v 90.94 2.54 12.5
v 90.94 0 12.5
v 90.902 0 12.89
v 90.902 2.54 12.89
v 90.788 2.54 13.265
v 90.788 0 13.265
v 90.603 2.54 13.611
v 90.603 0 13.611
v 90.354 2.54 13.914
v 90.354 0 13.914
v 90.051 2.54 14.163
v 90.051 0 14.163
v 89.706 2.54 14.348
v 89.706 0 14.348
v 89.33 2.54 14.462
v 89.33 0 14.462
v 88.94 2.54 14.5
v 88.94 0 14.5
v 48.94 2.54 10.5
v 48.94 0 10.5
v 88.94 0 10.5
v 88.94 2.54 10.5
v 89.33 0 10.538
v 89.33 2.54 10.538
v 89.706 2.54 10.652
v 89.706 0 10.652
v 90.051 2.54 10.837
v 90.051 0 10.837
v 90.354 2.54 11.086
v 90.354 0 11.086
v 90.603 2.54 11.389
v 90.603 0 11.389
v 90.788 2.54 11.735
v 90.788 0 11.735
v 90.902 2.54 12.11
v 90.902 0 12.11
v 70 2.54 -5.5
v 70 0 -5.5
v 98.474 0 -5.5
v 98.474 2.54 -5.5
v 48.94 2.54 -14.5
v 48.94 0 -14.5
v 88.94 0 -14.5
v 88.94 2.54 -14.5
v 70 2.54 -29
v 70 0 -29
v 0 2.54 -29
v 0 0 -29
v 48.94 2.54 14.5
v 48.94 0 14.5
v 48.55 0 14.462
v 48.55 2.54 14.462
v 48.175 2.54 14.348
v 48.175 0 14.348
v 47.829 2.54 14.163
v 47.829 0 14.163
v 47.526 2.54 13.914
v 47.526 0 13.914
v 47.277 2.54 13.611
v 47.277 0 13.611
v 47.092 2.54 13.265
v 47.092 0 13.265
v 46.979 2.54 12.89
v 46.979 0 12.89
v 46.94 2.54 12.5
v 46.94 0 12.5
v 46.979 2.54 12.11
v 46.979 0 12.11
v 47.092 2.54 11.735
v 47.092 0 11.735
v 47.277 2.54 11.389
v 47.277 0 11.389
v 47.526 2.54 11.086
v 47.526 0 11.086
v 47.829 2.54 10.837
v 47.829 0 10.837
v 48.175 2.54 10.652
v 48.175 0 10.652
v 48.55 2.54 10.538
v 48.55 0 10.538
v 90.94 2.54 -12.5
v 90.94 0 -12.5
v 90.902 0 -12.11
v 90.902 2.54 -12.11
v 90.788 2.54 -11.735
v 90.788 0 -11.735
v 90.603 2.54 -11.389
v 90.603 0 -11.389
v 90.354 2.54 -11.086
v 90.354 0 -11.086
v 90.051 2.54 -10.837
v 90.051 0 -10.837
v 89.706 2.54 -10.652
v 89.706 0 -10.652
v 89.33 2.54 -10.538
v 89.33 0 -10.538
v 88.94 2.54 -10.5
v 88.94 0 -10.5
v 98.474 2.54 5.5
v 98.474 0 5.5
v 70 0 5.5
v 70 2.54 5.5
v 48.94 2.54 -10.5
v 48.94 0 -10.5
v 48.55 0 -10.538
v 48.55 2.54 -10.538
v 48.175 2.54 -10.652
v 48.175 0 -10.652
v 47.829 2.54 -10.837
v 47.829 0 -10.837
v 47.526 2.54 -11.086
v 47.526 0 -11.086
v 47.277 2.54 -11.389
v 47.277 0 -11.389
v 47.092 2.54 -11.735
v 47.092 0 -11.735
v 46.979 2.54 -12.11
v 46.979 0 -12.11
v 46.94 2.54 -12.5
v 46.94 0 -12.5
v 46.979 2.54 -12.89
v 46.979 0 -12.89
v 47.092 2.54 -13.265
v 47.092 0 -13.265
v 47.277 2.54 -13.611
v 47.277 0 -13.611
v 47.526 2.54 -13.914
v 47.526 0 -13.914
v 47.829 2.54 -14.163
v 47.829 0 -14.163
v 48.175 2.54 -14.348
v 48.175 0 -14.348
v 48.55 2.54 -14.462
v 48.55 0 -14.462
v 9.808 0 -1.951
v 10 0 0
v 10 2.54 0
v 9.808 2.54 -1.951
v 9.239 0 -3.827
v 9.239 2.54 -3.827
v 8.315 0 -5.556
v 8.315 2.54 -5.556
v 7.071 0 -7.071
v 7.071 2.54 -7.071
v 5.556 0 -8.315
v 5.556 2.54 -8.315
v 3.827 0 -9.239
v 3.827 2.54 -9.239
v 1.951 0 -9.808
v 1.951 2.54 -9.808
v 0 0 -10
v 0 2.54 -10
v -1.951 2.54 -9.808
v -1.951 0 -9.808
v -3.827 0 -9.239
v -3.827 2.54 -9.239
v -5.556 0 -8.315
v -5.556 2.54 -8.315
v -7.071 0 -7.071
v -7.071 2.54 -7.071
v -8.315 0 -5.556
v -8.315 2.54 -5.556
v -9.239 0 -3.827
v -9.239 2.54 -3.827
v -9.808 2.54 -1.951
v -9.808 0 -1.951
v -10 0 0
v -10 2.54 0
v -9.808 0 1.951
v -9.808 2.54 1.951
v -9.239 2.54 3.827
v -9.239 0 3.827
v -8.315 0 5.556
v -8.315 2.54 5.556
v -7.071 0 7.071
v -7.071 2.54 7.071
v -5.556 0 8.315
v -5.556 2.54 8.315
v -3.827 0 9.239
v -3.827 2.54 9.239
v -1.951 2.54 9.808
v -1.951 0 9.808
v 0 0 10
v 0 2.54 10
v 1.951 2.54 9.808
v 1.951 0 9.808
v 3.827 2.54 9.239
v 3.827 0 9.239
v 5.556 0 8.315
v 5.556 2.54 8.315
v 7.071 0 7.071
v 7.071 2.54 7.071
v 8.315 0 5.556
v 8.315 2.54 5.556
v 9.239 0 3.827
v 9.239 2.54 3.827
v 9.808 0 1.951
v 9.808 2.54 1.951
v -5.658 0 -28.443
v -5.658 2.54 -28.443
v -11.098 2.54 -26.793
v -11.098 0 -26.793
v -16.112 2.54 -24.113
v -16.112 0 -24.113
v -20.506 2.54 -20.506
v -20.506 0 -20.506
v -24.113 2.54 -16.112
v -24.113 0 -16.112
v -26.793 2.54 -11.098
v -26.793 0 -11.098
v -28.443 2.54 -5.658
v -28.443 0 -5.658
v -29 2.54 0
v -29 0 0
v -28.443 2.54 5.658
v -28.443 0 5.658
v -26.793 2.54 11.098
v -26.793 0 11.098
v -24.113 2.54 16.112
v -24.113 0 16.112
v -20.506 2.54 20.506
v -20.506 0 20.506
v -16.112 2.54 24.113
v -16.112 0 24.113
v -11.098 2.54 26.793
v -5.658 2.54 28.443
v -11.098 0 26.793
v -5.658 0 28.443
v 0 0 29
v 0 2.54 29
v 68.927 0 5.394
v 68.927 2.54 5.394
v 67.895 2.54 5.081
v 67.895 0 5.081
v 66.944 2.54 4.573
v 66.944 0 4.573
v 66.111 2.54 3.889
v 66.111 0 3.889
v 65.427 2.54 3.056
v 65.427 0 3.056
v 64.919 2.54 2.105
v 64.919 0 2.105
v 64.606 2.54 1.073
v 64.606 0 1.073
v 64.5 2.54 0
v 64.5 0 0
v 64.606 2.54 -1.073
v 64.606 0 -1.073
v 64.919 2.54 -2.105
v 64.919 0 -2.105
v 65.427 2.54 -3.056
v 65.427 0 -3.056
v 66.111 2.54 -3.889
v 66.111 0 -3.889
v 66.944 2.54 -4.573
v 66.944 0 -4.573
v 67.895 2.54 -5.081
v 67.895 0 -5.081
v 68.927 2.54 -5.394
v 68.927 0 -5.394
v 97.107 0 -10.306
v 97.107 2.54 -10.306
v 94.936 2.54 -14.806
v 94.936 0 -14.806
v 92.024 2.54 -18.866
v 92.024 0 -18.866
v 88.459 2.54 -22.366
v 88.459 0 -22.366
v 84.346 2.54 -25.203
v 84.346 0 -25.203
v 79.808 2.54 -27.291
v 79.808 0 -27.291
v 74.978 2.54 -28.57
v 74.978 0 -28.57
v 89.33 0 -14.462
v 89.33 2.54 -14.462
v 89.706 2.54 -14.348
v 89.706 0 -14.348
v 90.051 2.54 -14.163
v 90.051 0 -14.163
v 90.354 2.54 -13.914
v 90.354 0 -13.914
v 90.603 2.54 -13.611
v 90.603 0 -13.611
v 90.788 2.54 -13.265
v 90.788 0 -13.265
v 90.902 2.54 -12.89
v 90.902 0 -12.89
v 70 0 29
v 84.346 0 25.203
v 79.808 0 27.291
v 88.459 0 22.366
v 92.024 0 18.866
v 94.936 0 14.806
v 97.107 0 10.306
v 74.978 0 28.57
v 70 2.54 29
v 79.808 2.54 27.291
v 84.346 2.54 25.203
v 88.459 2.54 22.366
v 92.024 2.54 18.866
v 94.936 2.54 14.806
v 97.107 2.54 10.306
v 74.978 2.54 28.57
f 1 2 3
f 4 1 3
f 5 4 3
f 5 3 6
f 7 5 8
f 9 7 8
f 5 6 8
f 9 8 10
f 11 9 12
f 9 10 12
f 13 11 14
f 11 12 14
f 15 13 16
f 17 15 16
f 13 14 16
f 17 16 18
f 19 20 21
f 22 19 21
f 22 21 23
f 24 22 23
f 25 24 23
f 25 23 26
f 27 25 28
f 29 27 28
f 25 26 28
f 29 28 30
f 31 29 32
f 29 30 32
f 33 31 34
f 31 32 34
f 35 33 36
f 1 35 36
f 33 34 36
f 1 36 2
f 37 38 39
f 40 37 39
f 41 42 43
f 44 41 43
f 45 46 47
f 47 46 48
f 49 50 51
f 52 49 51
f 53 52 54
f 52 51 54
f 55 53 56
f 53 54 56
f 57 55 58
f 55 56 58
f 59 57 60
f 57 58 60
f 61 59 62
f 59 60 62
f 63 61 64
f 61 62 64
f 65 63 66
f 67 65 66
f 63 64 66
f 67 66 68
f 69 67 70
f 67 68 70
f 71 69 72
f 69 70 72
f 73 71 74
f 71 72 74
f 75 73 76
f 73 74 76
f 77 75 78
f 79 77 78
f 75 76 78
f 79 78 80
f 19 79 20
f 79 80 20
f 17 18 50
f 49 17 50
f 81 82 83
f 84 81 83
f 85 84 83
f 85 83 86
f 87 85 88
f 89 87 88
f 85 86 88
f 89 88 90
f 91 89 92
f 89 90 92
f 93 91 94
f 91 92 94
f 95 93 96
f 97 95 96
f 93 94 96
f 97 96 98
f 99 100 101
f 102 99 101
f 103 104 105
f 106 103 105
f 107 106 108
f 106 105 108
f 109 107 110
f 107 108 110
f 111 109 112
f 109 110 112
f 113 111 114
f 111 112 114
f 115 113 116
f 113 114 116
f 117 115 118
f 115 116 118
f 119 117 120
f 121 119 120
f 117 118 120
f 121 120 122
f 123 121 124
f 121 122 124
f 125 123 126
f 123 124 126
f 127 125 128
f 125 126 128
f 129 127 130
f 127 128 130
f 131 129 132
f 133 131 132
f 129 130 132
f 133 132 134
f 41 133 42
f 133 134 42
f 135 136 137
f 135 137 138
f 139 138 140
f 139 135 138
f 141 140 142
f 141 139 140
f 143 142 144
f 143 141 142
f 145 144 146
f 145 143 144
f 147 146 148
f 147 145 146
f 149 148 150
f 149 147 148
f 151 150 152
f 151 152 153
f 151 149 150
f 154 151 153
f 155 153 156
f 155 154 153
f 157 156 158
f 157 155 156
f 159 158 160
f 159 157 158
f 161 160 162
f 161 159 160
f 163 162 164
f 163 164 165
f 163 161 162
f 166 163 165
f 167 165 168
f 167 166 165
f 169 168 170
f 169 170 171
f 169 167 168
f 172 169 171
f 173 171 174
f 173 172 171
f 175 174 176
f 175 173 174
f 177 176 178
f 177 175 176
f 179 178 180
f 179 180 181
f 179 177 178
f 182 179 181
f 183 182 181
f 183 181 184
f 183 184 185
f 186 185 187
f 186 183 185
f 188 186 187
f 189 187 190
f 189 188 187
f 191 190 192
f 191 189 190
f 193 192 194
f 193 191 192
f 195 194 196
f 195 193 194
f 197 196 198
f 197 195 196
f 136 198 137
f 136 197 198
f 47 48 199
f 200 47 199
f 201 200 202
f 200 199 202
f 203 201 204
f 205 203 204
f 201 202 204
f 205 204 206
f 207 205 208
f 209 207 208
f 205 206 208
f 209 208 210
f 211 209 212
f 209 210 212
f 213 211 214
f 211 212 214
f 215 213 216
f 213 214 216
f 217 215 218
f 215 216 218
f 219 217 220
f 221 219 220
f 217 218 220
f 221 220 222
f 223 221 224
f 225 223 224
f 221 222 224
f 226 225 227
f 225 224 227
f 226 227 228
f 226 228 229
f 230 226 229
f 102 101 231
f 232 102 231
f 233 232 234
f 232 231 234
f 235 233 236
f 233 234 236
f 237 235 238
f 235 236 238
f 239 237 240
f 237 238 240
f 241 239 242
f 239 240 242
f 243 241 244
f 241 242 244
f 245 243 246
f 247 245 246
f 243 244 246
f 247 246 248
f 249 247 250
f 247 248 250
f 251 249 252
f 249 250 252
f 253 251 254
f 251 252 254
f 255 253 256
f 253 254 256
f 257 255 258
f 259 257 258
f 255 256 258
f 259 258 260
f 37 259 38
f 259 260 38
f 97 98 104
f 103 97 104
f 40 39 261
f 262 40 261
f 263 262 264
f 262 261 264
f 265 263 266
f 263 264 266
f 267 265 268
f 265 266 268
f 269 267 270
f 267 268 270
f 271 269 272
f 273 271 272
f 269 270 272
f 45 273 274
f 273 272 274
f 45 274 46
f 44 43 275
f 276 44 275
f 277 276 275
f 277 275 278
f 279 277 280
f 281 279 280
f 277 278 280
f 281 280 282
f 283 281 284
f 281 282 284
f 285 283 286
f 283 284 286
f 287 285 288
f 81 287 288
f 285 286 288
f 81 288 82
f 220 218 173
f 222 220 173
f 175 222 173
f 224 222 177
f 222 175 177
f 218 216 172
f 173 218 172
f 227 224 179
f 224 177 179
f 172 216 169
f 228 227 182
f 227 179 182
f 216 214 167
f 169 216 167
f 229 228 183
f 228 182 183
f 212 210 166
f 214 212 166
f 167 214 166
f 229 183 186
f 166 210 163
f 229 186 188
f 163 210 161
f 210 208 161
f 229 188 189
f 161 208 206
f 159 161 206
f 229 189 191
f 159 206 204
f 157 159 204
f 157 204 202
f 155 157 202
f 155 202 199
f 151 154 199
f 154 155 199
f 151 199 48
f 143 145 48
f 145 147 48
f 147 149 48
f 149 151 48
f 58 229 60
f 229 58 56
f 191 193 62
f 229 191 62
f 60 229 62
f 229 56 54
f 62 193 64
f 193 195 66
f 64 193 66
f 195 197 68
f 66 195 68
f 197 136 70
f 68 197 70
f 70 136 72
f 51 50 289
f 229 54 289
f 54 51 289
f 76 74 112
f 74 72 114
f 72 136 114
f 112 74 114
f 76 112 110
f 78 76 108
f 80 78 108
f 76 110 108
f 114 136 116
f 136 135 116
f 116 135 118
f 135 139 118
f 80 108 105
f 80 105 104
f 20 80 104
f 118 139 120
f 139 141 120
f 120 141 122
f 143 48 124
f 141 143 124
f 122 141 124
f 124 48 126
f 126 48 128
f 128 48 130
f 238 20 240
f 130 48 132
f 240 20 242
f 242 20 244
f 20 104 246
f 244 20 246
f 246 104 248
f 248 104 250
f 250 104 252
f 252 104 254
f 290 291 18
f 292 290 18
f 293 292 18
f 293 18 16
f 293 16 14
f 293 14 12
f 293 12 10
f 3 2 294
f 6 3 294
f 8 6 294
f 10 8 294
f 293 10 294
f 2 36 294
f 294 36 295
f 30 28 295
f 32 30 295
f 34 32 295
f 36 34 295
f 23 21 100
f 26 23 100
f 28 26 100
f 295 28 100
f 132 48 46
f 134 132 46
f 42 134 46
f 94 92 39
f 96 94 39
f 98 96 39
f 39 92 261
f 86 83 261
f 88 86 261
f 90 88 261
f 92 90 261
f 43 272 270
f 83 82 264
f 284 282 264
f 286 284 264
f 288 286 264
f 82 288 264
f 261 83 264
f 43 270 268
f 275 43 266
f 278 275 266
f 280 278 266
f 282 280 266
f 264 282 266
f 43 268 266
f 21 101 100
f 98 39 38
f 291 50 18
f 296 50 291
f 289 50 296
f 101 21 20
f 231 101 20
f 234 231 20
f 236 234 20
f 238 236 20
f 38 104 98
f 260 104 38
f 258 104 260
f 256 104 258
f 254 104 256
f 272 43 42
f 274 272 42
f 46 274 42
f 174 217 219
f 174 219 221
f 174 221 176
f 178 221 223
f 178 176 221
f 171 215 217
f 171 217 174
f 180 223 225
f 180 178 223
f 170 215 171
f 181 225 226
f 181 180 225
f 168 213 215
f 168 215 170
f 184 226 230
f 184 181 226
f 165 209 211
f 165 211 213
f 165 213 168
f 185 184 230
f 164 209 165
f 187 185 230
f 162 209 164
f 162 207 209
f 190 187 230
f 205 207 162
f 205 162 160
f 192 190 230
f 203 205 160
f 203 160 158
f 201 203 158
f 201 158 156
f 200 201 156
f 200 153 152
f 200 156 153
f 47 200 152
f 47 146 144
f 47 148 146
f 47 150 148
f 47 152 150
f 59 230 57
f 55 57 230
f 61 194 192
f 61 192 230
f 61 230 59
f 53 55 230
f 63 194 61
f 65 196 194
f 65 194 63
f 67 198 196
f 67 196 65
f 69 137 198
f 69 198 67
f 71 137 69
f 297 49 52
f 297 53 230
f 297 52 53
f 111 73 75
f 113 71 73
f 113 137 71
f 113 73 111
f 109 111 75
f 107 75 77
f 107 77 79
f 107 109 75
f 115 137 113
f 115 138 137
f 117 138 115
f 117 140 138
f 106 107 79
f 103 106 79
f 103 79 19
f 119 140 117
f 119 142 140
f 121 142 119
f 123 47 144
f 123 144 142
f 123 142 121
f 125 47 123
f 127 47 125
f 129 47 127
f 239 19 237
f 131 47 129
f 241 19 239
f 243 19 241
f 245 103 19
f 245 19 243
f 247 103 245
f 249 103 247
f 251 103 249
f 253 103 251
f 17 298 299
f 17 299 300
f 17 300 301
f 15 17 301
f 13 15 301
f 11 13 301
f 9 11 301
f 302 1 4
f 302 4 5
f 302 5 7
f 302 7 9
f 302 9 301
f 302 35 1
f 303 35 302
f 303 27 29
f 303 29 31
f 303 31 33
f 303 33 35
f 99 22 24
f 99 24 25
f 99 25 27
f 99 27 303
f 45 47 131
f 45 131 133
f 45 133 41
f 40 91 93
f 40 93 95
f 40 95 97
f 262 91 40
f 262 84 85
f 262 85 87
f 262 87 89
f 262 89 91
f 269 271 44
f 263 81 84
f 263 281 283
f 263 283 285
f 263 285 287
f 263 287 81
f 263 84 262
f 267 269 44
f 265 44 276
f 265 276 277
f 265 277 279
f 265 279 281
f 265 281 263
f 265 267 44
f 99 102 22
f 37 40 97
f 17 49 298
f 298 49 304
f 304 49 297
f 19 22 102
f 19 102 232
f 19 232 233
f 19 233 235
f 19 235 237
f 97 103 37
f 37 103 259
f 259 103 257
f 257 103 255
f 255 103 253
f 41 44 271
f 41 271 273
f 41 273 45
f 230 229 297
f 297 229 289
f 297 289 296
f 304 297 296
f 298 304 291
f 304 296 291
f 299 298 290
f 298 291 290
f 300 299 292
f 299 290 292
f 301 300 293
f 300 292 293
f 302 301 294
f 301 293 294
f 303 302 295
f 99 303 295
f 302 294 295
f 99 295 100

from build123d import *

# Parameters (mm, degrees)
SKETCH1_R           = 29
SKETCH1_R_2         = 10
BOSS_EXTRUDE1_DEPTH = 2.54


with BuildPart() as part:
    # Sketch1 → Boss-Extrude1 (new body)
    with BuildSketch(Plane(origin=(0, 0, 0), x_dir=(1, 0, 0), z_dir=(0, 1, 0))):
        Circle(SKETCH1_R)
        Circle(SKETCH1_R_2, mode=Mode.SUBTRACT)
        with BuildLine():
            Line((70, 29), (0, 29))
            ThreePointArc((0, 29), (20.506096654, 20.506096654), (29, 0))
            ThreePointArc((29, 0), (20.506096654, -20.506096654), (0, -29))
            Line((0, -29), (70, -29))
            ThreePointArc((70, -29), (88.459414942, -22.366269246), (98.47367205, -5.5))
            Line((98.47367205, -5.5), (70, -5.5))
            ThreePointArc((70, -5.5), (64.5, 0), (70, 5.5))
            Line((70, 5.5), (98.47367205, 5.5))
            ThreePointArc((98.47367205, 5.5), (88.459414942, 22.366269246), (70, 29))
        make_face()
        with BuildLine():
            Line((88.940140067, -14.5), (48.940140067, -14.5))
            ThreePointArc((48.940140067, -14.5), (46.940140067, -12.5), (48.940140067, -10.5))
            Line((48.940140067, -10.5), (88.940140067, -10.5))
            ThreePointArc((88.940140067, -10.5), (90.354353629, -11.085786438), (90.940140067, -12.5))
            ThreePointArc((90.940140067, -12.5), (90.354353629, -13.914213562), (88.940140067, -14.5))
        make_face(mode=Mode.SUBTRACT)
        with BuildLine():
            Line((88.940140067, 10.5), (48.940140067, 10.5))
            ThreePointArc((48.940140067, 10.5), (46.940140067, 12.5), (48.940140067, 14.5))
            Line((48.940140067, 14.5), (88.940140067, 14.5))
            ThreePointArc((88.940140067, 14.5), (90.354353629, 13.914213562), (90.940140067, 12.5))
            ThreePointArc((90.940140067, 12.5), (90.354353629, 11.085786438), (88.940140067, 10.5))
        make_face(mode=Mode.SUBTRACT)
    extrude(amount=BOSS_EXTRUDE1_DEPTH)


solid = part.part
